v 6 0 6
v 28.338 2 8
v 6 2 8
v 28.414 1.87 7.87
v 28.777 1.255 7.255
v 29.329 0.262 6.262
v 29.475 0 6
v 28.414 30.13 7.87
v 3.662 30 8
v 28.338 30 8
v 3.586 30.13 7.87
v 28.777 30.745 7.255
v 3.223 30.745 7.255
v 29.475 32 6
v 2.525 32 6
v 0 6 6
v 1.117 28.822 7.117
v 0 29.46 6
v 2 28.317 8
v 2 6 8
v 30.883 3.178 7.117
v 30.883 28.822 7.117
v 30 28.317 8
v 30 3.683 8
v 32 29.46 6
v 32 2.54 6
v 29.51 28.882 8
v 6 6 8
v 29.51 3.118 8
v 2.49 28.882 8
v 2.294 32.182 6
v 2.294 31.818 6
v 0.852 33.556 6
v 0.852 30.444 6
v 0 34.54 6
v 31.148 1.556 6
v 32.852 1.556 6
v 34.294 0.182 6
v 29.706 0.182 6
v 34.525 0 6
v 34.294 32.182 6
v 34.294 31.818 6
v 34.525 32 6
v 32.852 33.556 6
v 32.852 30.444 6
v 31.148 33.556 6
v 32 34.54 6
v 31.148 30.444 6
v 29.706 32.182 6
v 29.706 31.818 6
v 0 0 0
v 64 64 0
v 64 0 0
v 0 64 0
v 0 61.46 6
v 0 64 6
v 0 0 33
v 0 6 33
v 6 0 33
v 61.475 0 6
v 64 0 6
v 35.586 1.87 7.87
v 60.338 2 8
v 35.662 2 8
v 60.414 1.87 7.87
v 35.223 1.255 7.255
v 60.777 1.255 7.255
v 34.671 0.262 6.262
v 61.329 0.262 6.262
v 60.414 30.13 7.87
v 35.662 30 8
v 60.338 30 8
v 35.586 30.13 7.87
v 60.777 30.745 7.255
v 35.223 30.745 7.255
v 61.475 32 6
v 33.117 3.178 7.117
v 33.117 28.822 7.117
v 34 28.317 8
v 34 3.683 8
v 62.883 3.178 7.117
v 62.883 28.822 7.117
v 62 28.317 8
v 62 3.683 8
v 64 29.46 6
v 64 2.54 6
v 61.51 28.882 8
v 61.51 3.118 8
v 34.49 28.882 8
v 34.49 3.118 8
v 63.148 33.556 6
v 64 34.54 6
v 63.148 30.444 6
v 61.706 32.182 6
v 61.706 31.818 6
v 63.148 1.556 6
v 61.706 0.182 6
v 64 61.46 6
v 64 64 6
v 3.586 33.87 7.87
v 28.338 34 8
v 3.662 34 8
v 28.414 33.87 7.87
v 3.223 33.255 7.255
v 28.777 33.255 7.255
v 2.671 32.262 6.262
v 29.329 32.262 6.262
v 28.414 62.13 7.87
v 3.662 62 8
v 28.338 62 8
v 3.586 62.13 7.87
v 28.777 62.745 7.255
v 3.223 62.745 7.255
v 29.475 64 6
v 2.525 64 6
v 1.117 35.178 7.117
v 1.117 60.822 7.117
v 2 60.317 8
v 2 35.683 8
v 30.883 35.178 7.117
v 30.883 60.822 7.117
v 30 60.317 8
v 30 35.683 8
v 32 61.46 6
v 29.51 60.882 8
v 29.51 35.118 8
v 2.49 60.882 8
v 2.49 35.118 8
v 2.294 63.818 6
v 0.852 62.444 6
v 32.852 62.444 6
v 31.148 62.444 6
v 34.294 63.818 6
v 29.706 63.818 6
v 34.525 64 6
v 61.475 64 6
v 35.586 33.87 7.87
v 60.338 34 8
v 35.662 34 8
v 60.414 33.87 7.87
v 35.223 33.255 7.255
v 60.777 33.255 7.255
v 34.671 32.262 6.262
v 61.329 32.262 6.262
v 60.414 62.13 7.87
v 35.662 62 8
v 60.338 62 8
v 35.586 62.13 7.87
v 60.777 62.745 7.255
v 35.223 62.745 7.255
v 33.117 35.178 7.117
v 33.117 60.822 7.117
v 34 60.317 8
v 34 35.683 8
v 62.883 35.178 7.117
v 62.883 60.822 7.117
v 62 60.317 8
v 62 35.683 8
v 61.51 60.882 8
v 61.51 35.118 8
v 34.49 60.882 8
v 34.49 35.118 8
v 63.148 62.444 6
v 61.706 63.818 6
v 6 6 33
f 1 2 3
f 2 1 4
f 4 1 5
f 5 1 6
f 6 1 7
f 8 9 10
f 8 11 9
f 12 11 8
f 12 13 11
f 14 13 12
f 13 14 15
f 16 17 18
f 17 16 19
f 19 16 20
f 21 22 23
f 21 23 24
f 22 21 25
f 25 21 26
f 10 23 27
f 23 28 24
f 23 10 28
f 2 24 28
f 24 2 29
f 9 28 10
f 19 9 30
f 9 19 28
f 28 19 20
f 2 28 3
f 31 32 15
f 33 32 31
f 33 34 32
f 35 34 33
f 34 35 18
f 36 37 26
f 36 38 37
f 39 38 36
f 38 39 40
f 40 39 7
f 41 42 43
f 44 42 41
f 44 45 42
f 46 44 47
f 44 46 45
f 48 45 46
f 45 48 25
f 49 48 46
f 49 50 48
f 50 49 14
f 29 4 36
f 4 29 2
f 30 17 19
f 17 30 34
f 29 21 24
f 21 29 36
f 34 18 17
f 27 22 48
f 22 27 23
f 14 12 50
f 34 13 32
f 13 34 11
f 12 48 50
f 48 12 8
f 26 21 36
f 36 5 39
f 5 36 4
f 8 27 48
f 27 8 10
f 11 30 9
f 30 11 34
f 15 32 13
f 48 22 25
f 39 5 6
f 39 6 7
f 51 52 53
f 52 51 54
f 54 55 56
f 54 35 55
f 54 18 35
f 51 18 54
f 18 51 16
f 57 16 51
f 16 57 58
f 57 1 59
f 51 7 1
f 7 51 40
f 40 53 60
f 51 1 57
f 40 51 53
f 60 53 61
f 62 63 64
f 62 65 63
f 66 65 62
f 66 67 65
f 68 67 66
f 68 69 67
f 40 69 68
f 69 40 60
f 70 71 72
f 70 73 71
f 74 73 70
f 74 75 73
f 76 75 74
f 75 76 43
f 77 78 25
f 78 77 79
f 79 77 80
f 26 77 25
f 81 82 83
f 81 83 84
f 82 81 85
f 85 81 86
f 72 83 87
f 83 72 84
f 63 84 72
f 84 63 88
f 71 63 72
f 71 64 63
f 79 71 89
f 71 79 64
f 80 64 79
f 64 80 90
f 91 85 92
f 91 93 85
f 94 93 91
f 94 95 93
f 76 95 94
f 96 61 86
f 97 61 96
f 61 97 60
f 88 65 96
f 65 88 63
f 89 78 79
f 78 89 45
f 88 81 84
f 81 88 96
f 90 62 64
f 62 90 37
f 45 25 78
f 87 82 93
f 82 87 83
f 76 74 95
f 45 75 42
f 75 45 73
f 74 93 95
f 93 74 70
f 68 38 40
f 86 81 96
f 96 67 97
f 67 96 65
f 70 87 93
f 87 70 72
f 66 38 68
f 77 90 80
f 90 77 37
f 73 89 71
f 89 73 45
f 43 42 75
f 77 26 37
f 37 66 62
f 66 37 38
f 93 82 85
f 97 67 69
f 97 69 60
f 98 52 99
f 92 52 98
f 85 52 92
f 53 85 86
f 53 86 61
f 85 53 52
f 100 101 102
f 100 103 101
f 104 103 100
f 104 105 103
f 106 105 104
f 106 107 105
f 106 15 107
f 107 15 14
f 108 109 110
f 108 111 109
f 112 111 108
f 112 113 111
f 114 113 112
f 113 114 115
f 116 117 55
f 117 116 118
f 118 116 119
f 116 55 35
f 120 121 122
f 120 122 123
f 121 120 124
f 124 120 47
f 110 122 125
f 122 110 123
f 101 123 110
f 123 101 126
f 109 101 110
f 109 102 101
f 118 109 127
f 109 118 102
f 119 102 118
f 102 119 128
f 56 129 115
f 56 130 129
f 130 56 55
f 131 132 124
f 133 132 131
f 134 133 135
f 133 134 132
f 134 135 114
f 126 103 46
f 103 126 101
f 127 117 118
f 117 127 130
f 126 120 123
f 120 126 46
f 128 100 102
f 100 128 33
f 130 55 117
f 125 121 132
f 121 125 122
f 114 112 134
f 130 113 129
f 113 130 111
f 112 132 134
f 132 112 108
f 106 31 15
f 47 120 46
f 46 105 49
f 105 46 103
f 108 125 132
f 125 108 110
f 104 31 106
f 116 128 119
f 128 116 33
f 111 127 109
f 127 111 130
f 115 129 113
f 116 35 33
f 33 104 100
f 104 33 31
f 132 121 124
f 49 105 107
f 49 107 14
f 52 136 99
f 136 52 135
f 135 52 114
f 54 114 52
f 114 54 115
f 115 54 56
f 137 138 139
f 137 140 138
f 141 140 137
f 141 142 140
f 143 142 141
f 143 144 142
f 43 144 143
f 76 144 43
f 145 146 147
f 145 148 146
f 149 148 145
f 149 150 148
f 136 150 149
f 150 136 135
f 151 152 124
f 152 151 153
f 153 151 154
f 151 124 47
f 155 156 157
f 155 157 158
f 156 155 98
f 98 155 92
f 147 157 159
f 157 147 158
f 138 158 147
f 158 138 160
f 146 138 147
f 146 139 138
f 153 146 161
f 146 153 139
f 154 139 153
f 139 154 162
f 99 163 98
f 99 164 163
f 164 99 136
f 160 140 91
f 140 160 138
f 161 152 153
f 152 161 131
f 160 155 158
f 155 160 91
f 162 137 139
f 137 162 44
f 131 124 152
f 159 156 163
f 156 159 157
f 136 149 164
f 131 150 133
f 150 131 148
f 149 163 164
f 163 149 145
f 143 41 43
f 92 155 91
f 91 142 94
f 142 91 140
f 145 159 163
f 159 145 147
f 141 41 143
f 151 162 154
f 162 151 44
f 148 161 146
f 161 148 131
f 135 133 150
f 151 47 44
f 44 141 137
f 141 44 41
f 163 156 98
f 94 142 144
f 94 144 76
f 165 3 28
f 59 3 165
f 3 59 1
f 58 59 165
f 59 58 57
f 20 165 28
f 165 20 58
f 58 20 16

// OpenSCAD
// file: WylochStyleDungeonLibrary.scad
size = 32;
baseheight = 6;
topperheight = 2;
topperrounded = true;
walllength = size;
wallheight = 25 + baseheight + topperheight;
wallwidth = 6;
wallwidththin = 4;

function hypotenuse_ra(side_a, side_b) =
    sqrt(pow(side_a, 2) + pow(side_b, 2));
    
module wsdl_Base(s,bh)
{
    cube([s,s,bh]);
}

module wsdl_Topper(s,bh,th,tr)
{
    if (tr) {
        translate([0,0,bh])
            intersection() {
                difference () {
                        cube([s,s,th]);
                        union () {
                        rotate(a=45, v=[1,0,0])
                            cube([s,th*2,th*2]);
                        translate([0,s,0])
                            rotate(a=45, v=[1,0,0])
                                cube([s,th*2,th*2]);
                        rotate(a=-45, v=[0,1,0])
                            cube([th*2,s,th*2]);
                        translate([s,0,0])
                            rotate(a=-45, v=[0,1,0])
                                cube([th*2,s,th*2]);
                        }
                }
                translate([s/2,s/2,0])
                    cylinder(
                        h=th, 
                        r1=hypotenuse_ra(s/2-1.2, s/2-1.2), 
                        r2=hypotenuse_ra(s/2-th-.8, s/2-th-.8), 
                        center=false, 
                        $fa=.1);
            }    
    }
    else {
        translate([0,0,bh])
            difference() {
                cube([s,s,th]);
                union () {
                rotate(a=45, v=[1,0,0])
                    cube([s,th*2,th*2]);
                translate([0,s,0])
                    rotate(a=45, v=[1,0,0])
                        cube([s,th*2,th*2]);
                rotate(a=-45, v=[0,1,0])
                    cube([th*2,s,th*2]);
                translate([s,0,0])
                    rotate(a=-45, v=[0,1,0])
                        cube([th*2,s,th*2]);
                }
            }    
    }
}

module wsdl_Base_1x1(s,bh,th,tr) 
{
    union () {
        wsdl_Base(s,bh);
        wsdl_Topper(s,bh,th,tr);
    }
}

module wsdl_Base_1x2(s,bh,th,tr)
{
    union () {
        wsdl_Base_1x1(s,bh,th,tr);
        translate([s,0,0])
            wsdl_Base_1x1(s,bh,th,tr);
    }
}
 
module wsdl_Base_2x2(s,bh,th,tr)
{
    union () {
        wsdl_Base_1x2(s,bh,th,tr);
        translate([0,s,0])
            wsdl_Base_1x2(s,bh,th,tr);
    }
}
 
module wsdl_Base_2x4(s,bh,th,tr)
{
    union () {
        wsdl_Base_2x2(s,bh,th,tr);
        translate([s*2,0,0])
            wsdl_Base_2x2(s,bh,th,tr);
    }
}
 
module wsdl_Base_4x4(s,bh,th,tr)
{
    union () {
        wsdl_Base_2x4(s,bh,th,tr);
        translate([0,s*2,0])
            wsdl_Base_2x4(s,bh,th,tr);
    }
}
 
module wsdl_Wall_1(w,l,h)
{
    cube([w,l,h]);   
}

module wsdl_Wall_2(w,l,h)
{
    union() {
        wsdl_Wall_1(w,l,h);
        translate([0,l,0])
            wsdl_Wall_1(w,l,h);
    }
}

module wsdl_Wall_1_Left(w,l,h) 
{
    wsdl_Wall_1(w,l,h);
}

module wsdl_Wall_1_Right(w,l,h) 
{
    translate([(size)-w,0,0])
        wsdl_Wall_1(w,l,h);
}

module wsdl_Wall_1_DoubleRight(w,l,h) 
{
    translate([(size*2)-w,0,0])
        wsdl_Wall_1(w,l,h);
}

module wsdl_Wall_1_Bottom(w,l,h) 
{
rotate(a=-90)
    translate([-w,0,0])
        wsdl_Wall_1(w,l,h);

}

module wsdl_Wall_1_Top(w,l,h) 
{
rotate(a=-90)
    translate([-l,0,0])
        wsdl_Wall_1(w,l,h);

}

module wsdl_Wall_1_Center(w,l,h) 
{
    translate([(size)-w/2,0,0])
        wsdl_Wall_1(w,l,h);
}


module wsdl_Wall_2_Left(w,l,h) 
{
    wsdl_Wall_2(w,l,h);
}

module wsdl_Wall_2_Right(w,l,h) 
{
    translate([(size*2)-w,0,0])
        wsdl_Wall_2(w,l,h);
}

module wsdl_Wall_2_Bottom(w,l,h) 
{
rotate(a=-90)
    translate([-w,0,0])
        wsdl_Wall_2(w,l,h);

}

module wsdl_Wall_2_Top(w,l,h) 
{
rotate(a=-90)
    translate([-l*2,0,0])
        wsdl_Wall_2(w,l,h);

}

module wsdl_Wall_2_Center(w,l,h) 
{
    translate([(size)-w/2,0,0])
        wsdl_Wall_2(w,l,h);
}
// main file
include <WylochStyleDungeonLibrary.scad>; 

wsdl_Base_2x2(size,baseheight,topperheight,topperrounded);
//Create Pillar with modified wall
wsdl_Wall_1_Left(wallwidth,wallwidth,wallheight);
